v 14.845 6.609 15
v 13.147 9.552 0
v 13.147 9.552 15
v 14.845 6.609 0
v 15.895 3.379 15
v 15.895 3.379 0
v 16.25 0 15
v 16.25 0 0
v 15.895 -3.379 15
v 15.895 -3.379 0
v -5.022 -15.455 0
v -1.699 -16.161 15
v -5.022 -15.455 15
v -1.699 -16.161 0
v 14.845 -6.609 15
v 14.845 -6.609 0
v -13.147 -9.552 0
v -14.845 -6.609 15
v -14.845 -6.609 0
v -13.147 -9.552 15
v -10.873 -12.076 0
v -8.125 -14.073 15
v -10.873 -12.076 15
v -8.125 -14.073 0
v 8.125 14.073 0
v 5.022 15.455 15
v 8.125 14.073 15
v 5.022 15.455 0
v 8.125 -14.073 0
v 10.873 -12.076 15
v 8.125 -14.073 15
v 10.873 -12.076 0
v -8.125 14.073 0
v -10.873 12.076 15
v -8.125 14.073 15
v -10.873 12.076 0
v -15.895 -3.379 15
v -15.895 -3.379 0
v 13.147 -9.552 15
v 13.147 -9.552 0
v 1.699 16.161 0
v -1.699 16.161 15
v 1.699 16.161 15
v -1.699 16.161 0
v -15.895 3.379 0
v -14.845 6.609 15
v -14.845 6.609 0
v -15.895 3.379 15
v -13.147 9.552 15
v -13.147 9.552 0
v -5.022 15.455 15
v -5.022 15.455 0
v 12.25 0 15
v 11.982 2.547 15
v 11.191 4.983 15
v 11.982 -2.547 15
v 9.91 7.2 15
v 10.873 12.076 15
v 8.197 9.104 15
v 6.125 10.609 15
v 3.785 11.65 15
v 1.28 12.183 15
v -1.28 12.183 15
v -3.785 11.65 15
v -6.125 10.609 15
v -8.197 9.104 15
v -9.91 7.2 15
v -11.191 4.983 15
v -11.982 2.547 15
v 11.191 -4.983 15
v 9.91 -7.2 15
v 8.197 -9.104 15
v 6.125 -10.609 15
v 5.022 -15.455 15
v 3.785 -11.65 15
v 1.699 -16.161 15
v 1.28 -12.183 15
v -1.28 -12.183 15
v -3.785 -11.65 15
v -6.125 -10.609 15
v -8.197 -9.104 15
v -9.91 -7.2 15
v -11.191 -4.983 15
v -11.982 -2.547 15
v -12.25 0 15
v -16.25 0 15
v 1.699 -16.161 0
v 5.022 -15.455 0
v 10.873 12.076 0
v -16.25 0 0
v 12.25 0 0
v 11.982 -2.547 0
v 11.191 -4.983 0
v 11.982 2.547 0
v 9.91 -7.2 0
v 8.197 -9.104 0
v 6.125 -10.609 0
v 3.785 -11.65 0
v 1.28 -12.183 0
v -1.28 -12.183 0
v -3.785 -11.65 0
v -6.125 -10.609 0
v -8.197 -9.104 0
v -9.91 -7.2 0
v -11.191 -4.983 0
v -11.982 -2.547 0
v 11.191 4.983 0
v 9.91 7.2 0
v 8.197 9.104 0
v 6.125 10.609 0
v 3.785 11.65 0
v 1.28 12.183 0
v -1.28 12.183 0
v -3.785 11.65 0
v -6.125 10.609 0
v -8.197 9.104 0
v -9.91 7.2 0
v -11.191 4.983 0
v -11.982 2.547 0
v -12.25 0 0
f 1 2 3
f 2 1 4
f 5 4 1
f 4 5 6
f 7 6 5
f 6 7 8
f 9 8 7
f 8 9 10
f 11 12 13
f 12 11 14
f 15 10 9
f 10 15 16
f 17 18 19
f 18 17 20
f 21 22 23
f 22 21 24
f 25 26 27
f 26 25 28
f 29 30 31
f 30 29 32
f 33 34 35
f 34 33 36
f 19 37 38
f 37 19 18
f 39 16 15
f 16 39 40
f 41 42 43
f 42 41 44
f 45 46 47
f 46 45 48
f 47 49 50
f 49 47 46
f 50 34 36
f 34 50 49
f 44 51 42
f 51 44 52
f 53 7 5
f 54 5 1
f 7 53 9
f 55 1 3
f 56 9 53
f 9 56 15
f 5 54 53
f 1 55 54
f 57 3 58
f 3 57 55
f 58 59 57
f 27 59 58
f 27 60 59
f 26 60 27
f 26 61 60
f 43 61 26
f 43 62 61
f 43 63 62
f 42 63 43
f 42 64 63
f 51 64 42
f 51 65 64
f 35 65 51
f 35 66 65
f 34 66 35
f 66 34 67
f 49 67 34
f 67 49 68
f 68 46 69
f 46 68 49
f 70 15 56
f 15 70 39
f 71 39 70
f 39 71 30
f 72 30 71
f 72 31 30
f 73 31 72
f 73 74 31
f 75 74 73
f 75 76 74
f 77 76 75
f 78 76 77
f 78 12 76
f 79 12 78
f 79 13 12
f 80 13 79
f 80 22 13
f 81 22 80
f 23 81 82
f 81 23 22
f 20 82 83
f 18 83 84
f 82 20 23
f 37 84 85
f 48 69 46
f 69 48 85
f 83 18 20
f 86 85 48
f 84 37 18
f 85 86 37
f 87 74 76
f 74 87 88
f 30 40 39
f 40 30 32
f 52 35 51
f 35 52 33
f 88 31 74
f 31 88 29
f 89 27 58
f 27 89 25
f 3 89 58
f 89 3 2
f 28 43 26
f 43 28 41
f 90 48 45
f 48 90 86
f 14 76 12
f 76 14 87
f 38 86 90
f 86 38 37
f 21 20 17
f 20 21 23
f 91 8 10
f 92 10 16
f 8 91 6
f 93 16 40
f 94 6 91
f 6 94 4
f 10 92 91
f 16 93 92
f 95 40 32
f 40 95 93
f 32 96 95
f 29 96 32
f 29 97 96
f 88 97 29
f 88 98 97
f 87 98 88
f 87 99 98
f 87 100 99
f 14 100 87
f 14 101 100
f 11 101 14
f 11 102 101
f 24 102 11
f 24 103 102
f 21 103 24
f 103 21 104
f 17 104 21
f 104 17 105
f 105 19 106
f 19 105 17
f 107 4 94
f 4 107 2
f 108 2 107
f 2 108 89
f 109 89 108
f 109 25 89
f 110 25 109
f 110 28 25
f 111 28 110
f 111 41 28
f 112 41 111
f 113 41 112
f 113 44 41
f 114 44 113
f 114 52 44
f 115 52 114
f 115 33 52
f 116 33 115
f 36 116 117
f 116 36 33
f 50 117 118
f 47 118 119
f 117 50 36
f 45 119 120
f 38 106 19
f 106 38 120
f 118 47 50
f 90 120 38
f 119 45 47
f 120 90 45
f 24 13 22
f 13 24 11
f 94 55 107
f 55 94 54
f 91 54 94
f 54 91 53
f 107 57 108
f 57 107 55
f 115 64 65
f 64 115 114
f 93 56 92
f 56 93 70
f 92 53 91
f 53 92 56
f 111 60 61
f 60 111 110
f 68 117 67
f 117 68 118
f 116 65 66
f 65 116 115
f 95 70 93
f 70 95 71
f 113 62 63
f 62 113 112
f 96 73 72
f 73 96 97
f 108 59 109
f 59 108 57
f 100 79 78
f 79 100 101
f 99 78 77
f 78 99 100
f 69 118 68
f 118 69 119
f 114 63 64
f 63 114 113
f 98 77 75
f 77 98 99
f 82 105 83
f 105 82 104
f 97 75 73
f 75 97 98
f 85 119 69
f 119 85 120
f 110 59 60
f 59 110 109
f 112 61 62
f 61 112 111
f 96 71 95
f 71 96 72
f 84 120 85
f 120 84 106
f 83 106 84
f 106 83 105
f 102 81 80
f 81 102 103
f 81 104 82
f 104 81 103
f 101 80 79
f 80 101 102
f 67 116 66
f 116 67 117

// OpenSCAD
// file: lib.scad
OD = 24.5;

module tube(od, id, h){
  difference(){
    color([1, .3, .6])cylinder(d=od, h=h);
    translate([0, 0, -1])cylinder(d=id, h=h + 2);
  }
}
// main file
include <lib.scad>

thickness = 4;
OD = 24.5;

tube(OD + 2 * thickness, OD, 15);
